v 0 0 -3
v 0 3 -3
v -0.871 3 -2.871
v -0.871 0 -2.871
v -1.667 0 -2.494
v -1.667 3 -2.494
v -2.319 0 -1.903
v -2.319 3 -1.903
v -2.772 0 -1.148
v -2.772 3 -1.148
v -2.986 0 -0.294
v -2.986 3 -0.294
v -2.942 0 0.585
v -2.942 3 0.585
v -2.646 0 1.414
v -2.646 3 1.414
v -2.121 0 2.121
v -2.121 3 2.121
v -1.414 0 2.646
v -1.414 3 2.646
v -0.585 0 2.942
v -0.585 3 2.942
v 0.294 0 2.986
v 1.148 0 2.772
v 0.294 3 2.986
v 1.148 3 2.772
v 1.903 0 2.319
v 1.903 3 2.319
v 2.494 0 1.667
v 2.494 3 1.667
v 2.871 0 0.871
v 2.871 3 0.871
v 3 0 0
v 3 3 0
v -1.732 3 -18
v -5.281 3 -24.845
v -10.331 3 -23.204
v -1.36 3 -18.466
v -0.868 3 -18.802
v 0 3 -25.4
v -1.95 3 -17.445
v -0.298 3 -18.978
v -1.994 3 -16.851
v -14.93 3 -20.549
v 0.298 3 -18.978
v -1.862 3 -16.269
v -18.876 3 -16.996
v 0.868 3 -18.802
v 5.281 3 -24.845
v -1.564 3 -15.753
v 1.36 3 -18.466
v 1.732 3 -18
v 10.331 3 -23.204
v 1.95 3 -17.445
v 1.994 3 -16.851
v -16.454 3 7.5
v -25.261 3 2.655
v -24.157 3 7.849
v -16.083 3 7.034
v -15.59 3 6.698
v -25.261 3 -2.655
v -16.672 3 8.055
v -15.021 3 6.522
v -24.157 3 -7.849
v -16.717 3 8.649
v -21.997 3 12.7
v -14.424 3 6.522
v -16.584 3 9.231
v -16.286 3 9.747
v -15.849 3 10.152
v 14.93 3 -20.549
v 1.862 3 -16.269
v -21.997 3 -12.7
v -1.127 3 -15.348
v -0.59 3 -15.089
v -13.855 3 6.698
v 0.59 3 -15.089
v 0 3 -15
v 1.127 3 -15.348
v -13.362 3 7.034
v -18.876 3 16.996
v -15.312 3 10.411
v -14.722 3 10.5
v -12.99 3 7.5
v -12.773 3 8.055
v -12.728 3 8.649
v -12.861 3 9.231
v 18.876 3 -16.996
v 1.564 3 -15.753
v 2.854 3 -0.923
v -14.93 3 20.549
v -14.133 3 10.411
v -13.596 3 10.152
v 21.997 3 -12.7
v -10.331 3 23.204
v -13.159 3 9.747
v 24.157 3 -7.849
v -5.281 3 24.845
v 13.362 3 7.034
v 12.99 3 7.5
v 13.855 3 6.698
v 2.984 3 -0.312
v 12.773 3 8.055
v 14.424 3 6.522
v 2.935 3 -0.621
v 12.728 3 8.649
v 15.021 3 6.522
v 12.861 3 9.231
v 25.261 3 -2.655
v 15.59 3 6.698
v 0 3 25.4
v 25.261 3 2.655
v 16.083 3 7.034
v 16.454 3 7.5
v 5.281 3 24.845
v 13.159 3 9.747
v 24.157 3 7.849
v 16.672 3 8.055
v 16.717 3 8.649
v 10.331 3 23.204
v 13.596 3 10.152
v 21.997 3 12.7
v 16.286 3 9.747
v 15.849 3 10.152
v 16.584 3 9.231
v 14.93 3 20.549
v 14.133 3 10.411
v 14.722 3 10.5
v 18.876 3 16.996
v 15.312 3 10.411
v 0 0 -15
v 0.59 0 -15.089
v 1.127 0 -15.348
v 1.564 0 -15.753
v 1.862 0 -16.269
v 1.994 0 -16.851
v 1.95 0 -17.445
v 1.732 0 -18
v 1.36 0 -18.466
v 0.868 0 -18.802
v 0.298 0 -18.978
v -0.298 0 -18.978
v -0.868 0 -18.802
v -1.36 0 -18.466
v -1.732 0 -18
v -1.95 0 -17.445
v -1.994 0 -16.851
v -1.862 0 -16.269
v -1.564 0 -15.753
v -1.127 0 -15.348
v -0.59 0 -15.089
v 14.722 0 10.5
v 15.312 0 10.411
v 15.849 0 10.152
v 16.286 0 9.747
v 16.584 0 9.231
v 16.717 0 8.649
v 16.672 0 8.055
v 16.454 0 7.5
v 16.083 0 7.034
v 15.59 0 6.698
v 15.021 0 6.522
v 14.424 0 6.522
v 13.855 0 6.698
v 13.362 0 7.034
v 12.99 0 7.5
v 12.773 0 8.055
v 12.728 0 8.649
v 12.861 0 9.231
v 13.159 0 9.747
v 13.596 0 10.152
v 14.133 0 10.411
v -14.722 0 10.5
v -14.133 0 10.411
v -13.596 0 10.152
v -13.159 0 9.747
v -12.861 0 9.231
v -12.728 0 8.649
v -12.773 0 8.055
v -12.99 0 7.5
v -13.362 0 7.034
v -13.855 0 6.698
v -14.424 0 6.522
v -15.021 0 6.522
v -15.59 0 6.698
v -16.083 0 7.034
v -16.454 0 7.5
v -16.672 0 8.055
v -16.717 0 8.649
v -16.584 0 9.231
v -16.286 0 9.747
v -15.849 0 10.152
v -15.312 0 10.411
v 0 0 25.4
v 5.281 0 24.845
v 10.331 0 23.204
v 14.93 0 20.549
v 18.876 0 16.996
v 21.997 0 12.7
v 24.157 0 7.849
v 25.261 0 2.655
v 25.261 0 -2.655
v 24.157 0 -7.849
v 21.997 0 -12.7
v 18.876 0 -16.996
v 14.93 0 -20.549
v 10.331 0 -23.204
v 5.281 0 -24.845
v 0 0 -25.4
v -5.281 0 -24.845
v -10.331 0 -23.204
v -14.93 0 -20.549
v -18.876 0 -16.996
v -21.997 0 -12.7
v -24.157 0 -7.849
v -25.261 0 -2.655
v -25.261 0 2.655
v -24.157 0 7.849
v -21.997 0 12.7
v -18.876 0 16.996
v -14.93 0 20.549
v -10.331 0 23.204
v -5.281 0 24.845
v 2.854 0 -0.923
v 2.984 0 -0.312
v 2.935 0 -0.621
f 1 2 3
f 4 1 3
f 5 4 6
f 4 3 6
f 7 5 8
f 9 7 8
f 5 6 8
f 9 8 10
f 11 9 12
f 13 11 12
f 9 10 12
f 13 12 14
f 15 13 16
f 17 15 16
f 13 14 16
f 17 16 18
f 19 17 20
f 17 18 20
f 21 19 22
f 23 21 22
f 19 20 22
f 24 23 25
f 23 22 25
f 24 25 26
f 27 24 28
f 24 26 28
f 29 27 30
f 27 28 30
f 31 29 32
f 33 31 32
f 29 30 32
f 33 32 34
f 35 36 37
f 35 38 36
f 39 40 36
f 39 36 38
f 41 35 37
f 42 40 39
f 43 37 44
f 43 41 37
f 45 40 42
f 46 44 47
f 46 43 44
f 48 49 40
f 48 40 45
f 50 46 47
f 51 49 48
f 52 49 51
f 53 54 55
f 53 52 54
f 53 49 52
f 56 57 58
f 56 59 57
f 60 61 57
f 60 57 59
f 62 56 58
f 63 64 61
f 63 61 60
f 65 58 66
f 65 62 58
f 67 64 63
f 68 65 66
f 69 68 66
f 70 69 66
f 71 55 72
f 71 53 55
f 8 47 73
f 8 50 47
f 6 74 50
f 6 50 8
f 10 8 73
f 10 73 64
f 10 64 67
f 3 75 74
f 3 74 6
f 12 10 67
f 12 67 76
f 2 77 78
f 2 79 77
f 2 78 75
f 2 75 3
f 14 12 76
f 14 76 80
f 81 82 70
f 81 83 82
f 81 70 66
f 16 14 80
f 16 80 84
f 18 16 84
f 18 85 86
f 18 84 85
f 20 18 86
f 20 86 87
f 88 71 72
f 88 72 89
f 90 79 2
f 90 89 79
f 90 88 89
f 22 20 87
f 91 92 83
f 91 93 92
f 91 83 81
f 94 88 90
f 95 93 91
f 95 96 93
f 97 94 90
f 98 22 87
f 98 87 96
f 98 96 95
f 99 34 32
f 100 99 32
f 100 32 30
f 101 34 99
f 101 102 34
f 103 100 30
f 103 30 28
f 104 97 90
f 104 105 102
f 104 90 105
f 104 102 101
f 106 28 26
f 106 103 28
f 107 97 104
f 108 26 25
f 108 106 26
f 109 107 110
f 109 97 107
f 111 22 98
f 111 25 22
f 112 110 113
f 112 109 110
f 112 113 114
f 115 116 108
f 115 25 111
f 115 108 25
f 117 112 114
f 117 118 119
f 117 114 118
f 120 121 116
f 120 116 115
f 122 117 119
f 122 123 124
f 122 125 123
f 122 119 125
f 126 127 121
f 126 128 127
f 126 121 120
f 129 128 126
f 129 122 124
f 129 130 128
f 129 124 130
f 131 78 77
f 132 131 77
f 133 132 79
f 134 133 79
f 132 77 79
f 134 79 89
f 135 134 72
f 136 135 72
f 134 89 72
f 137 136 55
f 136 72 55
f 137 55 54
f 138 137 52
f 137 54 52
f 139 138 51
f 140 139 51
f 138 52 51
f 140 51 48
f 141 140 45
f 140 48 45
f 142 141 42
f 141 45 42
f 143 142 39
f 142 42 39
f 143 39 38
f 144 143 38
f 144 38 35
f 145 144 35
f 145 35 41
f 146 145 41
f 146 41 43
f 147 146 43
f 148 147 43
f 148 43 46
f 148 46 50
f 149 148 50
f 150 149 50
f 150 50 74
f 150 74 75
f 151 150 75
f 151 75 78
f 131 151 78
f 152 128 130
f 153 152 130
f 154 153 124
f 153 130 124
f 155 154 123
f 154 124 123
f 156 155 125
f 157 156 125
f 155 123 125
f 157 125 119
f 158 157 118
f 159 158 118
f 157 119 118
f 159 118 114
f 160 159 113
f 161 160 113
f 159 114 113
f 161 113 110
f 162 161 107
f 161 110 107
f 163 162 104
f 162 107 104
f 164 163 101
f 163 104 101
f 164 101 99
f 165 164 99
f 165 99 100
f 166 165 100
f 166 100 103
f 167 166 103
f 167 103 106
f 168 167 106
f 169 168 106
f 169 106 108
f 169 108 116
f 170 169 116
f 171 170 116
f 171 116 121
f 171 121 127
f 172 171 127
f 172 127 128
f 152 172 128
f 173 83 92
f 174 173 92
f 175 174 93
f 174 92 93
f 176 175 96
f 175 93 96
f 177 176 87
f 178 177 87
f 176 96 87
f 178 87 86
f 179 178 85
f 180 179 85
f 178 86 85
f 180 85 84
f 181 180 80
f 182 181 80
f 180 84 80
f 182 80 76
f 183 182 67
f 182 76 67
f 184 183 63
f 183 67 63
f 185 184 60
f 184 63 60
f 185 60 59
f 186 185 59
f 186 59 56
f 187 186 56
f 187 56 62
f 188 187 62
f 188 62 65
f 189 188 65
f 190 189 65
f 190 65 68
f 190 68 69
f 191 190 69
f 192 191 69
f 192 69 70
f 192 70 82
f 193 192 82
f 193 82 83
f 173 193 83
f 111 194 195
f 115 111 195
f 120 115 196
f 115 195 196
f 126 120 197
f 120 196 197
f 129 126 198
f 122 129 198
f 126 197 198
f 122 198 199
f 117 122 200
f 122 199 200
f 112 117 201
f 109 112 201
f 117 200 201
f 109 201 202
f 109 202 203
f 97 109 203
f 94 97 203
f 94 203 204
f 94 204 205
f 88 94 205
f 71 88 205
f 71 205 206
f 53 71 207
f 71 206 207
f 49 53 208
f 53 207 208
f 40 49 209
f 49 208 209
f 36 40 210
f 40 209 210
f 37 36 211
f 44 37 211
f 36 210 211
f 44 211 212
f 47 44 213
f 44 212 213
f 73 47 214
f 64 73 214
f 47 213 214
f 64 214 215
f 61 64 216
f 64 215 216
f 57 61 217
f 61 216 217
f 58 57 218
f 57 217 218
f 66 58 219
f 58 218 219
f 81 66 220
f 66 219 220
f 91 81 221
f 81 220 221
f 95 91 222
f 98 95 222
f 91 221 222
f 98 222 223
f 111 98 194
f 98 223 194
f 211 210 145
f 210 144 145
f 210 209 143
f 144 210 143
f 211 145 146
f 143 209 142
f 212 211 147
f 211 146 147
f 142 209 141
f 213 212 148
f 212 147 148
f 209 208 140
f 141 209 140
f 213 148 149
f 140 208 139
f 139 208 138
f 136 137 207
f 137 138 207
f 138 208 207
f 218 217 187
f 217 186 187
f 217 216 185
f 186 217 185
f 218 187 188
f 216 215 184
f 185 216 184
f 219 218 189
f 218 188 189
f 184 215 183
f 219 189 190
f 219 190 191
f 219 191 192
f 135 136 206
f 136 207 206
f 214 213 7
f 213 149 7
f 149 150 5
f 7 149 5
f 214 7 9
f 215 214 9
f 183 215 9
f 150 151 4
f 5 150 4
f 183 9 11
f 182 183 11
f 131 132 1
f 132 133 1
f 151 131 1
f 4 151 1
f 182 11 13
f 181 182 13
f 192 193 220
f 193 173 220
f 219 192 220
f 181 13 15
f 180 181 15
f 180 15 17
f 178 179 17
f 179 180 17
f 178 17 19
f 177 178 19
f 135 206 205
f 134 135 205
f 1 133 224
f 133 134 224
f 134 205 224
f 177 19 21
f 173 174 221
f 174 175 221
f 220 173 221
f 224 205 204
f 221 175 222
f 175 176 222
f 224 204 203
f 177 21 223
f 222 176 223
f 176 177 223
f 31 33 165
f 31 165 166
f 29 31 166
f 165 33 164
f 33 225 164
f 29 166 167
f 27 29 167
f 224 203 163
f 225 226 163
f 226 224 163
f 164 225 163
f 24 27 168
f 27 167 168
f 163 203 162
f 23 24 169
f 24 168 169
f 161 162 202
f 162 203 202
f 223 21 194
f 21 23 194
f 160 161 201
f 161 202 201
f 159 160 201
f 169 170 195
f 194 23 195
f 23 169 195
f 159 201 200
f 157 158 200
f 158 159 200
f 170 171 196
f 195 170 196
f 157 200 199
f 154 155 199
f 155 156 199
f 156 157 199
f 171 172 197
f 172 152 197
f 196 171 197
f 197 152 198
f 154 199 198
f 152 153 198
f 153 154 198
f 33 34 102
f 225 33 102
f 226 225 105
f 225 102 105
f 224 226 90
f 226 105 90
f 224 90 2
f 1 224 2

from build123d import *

# Parameters (mm, degrees)
SKETCH1_R           = 25.4
BOSS_EXTRUDE1_DEPTH = 3
CUT_EXTRUDE1_DEPTH  = 5
SKETCH3_R           = 2
CUT_EXTRUDE2_DEPTH  = 5


with BuildPart() as part:
    # Sketch1 → Boss-Extrude1 (new body)
    with BuildSketch(Plane(origin=(0, 0, 0), x_dir=(1, 0, 0), z_dir=(0, 1, 0))):
        with Locations(Location((0, 0, 0), (0, 0, 270))):
            Circle(SKETCH1_R)
    extrude(amount=BOSS_EXTRUDE1_DEPTH)

    # Sketch2 → Cut-Extrude1 (cut)
    with BuildSketch(Plane(origin=(0, 3, 0), x_dir=(1, 0, 0), z_dir=(0, 1, 0))):
        with BuildLine():
            Line((2.854423328, 0.923183333), (0, 3))
            ThreePointArc((0, 3), (-2.121320344, -2.121320344), (3, 0))
            ThreePointArc((3, 0), (2.963382357, 0.467295419), (2.854423328, 0.923183333))
        make_face()
    extrude(amount=-CUT_EXTRUDE1_DEPTH, mode=Mode.SUBTRACT)

    # Sketch3 → Cut-Extrude2 (cut)
    with BuildSketch(Plane(origin=(0, 3, 0), x_dir=(1, 0, 0), z_dir=(0, 1, 0))):
        with Locations(Location((0, 17, 0), (0, 0, 270))):
            Circle(SKETCH3_R)
        with Locations(Location((14.722431864, -8.5, 0), (0, 0, 270))):
            Circle(SKETCH3_R)
        with Locations(Location((-14.722431864, -8.5, 0), (0, 0, 270))):
            Circle(SKETCH3_R)
    extrude(amount=-CUT_EXTRUDE2_DEPTH, mode=Mode.SUBTRACT)


solid = part.part
